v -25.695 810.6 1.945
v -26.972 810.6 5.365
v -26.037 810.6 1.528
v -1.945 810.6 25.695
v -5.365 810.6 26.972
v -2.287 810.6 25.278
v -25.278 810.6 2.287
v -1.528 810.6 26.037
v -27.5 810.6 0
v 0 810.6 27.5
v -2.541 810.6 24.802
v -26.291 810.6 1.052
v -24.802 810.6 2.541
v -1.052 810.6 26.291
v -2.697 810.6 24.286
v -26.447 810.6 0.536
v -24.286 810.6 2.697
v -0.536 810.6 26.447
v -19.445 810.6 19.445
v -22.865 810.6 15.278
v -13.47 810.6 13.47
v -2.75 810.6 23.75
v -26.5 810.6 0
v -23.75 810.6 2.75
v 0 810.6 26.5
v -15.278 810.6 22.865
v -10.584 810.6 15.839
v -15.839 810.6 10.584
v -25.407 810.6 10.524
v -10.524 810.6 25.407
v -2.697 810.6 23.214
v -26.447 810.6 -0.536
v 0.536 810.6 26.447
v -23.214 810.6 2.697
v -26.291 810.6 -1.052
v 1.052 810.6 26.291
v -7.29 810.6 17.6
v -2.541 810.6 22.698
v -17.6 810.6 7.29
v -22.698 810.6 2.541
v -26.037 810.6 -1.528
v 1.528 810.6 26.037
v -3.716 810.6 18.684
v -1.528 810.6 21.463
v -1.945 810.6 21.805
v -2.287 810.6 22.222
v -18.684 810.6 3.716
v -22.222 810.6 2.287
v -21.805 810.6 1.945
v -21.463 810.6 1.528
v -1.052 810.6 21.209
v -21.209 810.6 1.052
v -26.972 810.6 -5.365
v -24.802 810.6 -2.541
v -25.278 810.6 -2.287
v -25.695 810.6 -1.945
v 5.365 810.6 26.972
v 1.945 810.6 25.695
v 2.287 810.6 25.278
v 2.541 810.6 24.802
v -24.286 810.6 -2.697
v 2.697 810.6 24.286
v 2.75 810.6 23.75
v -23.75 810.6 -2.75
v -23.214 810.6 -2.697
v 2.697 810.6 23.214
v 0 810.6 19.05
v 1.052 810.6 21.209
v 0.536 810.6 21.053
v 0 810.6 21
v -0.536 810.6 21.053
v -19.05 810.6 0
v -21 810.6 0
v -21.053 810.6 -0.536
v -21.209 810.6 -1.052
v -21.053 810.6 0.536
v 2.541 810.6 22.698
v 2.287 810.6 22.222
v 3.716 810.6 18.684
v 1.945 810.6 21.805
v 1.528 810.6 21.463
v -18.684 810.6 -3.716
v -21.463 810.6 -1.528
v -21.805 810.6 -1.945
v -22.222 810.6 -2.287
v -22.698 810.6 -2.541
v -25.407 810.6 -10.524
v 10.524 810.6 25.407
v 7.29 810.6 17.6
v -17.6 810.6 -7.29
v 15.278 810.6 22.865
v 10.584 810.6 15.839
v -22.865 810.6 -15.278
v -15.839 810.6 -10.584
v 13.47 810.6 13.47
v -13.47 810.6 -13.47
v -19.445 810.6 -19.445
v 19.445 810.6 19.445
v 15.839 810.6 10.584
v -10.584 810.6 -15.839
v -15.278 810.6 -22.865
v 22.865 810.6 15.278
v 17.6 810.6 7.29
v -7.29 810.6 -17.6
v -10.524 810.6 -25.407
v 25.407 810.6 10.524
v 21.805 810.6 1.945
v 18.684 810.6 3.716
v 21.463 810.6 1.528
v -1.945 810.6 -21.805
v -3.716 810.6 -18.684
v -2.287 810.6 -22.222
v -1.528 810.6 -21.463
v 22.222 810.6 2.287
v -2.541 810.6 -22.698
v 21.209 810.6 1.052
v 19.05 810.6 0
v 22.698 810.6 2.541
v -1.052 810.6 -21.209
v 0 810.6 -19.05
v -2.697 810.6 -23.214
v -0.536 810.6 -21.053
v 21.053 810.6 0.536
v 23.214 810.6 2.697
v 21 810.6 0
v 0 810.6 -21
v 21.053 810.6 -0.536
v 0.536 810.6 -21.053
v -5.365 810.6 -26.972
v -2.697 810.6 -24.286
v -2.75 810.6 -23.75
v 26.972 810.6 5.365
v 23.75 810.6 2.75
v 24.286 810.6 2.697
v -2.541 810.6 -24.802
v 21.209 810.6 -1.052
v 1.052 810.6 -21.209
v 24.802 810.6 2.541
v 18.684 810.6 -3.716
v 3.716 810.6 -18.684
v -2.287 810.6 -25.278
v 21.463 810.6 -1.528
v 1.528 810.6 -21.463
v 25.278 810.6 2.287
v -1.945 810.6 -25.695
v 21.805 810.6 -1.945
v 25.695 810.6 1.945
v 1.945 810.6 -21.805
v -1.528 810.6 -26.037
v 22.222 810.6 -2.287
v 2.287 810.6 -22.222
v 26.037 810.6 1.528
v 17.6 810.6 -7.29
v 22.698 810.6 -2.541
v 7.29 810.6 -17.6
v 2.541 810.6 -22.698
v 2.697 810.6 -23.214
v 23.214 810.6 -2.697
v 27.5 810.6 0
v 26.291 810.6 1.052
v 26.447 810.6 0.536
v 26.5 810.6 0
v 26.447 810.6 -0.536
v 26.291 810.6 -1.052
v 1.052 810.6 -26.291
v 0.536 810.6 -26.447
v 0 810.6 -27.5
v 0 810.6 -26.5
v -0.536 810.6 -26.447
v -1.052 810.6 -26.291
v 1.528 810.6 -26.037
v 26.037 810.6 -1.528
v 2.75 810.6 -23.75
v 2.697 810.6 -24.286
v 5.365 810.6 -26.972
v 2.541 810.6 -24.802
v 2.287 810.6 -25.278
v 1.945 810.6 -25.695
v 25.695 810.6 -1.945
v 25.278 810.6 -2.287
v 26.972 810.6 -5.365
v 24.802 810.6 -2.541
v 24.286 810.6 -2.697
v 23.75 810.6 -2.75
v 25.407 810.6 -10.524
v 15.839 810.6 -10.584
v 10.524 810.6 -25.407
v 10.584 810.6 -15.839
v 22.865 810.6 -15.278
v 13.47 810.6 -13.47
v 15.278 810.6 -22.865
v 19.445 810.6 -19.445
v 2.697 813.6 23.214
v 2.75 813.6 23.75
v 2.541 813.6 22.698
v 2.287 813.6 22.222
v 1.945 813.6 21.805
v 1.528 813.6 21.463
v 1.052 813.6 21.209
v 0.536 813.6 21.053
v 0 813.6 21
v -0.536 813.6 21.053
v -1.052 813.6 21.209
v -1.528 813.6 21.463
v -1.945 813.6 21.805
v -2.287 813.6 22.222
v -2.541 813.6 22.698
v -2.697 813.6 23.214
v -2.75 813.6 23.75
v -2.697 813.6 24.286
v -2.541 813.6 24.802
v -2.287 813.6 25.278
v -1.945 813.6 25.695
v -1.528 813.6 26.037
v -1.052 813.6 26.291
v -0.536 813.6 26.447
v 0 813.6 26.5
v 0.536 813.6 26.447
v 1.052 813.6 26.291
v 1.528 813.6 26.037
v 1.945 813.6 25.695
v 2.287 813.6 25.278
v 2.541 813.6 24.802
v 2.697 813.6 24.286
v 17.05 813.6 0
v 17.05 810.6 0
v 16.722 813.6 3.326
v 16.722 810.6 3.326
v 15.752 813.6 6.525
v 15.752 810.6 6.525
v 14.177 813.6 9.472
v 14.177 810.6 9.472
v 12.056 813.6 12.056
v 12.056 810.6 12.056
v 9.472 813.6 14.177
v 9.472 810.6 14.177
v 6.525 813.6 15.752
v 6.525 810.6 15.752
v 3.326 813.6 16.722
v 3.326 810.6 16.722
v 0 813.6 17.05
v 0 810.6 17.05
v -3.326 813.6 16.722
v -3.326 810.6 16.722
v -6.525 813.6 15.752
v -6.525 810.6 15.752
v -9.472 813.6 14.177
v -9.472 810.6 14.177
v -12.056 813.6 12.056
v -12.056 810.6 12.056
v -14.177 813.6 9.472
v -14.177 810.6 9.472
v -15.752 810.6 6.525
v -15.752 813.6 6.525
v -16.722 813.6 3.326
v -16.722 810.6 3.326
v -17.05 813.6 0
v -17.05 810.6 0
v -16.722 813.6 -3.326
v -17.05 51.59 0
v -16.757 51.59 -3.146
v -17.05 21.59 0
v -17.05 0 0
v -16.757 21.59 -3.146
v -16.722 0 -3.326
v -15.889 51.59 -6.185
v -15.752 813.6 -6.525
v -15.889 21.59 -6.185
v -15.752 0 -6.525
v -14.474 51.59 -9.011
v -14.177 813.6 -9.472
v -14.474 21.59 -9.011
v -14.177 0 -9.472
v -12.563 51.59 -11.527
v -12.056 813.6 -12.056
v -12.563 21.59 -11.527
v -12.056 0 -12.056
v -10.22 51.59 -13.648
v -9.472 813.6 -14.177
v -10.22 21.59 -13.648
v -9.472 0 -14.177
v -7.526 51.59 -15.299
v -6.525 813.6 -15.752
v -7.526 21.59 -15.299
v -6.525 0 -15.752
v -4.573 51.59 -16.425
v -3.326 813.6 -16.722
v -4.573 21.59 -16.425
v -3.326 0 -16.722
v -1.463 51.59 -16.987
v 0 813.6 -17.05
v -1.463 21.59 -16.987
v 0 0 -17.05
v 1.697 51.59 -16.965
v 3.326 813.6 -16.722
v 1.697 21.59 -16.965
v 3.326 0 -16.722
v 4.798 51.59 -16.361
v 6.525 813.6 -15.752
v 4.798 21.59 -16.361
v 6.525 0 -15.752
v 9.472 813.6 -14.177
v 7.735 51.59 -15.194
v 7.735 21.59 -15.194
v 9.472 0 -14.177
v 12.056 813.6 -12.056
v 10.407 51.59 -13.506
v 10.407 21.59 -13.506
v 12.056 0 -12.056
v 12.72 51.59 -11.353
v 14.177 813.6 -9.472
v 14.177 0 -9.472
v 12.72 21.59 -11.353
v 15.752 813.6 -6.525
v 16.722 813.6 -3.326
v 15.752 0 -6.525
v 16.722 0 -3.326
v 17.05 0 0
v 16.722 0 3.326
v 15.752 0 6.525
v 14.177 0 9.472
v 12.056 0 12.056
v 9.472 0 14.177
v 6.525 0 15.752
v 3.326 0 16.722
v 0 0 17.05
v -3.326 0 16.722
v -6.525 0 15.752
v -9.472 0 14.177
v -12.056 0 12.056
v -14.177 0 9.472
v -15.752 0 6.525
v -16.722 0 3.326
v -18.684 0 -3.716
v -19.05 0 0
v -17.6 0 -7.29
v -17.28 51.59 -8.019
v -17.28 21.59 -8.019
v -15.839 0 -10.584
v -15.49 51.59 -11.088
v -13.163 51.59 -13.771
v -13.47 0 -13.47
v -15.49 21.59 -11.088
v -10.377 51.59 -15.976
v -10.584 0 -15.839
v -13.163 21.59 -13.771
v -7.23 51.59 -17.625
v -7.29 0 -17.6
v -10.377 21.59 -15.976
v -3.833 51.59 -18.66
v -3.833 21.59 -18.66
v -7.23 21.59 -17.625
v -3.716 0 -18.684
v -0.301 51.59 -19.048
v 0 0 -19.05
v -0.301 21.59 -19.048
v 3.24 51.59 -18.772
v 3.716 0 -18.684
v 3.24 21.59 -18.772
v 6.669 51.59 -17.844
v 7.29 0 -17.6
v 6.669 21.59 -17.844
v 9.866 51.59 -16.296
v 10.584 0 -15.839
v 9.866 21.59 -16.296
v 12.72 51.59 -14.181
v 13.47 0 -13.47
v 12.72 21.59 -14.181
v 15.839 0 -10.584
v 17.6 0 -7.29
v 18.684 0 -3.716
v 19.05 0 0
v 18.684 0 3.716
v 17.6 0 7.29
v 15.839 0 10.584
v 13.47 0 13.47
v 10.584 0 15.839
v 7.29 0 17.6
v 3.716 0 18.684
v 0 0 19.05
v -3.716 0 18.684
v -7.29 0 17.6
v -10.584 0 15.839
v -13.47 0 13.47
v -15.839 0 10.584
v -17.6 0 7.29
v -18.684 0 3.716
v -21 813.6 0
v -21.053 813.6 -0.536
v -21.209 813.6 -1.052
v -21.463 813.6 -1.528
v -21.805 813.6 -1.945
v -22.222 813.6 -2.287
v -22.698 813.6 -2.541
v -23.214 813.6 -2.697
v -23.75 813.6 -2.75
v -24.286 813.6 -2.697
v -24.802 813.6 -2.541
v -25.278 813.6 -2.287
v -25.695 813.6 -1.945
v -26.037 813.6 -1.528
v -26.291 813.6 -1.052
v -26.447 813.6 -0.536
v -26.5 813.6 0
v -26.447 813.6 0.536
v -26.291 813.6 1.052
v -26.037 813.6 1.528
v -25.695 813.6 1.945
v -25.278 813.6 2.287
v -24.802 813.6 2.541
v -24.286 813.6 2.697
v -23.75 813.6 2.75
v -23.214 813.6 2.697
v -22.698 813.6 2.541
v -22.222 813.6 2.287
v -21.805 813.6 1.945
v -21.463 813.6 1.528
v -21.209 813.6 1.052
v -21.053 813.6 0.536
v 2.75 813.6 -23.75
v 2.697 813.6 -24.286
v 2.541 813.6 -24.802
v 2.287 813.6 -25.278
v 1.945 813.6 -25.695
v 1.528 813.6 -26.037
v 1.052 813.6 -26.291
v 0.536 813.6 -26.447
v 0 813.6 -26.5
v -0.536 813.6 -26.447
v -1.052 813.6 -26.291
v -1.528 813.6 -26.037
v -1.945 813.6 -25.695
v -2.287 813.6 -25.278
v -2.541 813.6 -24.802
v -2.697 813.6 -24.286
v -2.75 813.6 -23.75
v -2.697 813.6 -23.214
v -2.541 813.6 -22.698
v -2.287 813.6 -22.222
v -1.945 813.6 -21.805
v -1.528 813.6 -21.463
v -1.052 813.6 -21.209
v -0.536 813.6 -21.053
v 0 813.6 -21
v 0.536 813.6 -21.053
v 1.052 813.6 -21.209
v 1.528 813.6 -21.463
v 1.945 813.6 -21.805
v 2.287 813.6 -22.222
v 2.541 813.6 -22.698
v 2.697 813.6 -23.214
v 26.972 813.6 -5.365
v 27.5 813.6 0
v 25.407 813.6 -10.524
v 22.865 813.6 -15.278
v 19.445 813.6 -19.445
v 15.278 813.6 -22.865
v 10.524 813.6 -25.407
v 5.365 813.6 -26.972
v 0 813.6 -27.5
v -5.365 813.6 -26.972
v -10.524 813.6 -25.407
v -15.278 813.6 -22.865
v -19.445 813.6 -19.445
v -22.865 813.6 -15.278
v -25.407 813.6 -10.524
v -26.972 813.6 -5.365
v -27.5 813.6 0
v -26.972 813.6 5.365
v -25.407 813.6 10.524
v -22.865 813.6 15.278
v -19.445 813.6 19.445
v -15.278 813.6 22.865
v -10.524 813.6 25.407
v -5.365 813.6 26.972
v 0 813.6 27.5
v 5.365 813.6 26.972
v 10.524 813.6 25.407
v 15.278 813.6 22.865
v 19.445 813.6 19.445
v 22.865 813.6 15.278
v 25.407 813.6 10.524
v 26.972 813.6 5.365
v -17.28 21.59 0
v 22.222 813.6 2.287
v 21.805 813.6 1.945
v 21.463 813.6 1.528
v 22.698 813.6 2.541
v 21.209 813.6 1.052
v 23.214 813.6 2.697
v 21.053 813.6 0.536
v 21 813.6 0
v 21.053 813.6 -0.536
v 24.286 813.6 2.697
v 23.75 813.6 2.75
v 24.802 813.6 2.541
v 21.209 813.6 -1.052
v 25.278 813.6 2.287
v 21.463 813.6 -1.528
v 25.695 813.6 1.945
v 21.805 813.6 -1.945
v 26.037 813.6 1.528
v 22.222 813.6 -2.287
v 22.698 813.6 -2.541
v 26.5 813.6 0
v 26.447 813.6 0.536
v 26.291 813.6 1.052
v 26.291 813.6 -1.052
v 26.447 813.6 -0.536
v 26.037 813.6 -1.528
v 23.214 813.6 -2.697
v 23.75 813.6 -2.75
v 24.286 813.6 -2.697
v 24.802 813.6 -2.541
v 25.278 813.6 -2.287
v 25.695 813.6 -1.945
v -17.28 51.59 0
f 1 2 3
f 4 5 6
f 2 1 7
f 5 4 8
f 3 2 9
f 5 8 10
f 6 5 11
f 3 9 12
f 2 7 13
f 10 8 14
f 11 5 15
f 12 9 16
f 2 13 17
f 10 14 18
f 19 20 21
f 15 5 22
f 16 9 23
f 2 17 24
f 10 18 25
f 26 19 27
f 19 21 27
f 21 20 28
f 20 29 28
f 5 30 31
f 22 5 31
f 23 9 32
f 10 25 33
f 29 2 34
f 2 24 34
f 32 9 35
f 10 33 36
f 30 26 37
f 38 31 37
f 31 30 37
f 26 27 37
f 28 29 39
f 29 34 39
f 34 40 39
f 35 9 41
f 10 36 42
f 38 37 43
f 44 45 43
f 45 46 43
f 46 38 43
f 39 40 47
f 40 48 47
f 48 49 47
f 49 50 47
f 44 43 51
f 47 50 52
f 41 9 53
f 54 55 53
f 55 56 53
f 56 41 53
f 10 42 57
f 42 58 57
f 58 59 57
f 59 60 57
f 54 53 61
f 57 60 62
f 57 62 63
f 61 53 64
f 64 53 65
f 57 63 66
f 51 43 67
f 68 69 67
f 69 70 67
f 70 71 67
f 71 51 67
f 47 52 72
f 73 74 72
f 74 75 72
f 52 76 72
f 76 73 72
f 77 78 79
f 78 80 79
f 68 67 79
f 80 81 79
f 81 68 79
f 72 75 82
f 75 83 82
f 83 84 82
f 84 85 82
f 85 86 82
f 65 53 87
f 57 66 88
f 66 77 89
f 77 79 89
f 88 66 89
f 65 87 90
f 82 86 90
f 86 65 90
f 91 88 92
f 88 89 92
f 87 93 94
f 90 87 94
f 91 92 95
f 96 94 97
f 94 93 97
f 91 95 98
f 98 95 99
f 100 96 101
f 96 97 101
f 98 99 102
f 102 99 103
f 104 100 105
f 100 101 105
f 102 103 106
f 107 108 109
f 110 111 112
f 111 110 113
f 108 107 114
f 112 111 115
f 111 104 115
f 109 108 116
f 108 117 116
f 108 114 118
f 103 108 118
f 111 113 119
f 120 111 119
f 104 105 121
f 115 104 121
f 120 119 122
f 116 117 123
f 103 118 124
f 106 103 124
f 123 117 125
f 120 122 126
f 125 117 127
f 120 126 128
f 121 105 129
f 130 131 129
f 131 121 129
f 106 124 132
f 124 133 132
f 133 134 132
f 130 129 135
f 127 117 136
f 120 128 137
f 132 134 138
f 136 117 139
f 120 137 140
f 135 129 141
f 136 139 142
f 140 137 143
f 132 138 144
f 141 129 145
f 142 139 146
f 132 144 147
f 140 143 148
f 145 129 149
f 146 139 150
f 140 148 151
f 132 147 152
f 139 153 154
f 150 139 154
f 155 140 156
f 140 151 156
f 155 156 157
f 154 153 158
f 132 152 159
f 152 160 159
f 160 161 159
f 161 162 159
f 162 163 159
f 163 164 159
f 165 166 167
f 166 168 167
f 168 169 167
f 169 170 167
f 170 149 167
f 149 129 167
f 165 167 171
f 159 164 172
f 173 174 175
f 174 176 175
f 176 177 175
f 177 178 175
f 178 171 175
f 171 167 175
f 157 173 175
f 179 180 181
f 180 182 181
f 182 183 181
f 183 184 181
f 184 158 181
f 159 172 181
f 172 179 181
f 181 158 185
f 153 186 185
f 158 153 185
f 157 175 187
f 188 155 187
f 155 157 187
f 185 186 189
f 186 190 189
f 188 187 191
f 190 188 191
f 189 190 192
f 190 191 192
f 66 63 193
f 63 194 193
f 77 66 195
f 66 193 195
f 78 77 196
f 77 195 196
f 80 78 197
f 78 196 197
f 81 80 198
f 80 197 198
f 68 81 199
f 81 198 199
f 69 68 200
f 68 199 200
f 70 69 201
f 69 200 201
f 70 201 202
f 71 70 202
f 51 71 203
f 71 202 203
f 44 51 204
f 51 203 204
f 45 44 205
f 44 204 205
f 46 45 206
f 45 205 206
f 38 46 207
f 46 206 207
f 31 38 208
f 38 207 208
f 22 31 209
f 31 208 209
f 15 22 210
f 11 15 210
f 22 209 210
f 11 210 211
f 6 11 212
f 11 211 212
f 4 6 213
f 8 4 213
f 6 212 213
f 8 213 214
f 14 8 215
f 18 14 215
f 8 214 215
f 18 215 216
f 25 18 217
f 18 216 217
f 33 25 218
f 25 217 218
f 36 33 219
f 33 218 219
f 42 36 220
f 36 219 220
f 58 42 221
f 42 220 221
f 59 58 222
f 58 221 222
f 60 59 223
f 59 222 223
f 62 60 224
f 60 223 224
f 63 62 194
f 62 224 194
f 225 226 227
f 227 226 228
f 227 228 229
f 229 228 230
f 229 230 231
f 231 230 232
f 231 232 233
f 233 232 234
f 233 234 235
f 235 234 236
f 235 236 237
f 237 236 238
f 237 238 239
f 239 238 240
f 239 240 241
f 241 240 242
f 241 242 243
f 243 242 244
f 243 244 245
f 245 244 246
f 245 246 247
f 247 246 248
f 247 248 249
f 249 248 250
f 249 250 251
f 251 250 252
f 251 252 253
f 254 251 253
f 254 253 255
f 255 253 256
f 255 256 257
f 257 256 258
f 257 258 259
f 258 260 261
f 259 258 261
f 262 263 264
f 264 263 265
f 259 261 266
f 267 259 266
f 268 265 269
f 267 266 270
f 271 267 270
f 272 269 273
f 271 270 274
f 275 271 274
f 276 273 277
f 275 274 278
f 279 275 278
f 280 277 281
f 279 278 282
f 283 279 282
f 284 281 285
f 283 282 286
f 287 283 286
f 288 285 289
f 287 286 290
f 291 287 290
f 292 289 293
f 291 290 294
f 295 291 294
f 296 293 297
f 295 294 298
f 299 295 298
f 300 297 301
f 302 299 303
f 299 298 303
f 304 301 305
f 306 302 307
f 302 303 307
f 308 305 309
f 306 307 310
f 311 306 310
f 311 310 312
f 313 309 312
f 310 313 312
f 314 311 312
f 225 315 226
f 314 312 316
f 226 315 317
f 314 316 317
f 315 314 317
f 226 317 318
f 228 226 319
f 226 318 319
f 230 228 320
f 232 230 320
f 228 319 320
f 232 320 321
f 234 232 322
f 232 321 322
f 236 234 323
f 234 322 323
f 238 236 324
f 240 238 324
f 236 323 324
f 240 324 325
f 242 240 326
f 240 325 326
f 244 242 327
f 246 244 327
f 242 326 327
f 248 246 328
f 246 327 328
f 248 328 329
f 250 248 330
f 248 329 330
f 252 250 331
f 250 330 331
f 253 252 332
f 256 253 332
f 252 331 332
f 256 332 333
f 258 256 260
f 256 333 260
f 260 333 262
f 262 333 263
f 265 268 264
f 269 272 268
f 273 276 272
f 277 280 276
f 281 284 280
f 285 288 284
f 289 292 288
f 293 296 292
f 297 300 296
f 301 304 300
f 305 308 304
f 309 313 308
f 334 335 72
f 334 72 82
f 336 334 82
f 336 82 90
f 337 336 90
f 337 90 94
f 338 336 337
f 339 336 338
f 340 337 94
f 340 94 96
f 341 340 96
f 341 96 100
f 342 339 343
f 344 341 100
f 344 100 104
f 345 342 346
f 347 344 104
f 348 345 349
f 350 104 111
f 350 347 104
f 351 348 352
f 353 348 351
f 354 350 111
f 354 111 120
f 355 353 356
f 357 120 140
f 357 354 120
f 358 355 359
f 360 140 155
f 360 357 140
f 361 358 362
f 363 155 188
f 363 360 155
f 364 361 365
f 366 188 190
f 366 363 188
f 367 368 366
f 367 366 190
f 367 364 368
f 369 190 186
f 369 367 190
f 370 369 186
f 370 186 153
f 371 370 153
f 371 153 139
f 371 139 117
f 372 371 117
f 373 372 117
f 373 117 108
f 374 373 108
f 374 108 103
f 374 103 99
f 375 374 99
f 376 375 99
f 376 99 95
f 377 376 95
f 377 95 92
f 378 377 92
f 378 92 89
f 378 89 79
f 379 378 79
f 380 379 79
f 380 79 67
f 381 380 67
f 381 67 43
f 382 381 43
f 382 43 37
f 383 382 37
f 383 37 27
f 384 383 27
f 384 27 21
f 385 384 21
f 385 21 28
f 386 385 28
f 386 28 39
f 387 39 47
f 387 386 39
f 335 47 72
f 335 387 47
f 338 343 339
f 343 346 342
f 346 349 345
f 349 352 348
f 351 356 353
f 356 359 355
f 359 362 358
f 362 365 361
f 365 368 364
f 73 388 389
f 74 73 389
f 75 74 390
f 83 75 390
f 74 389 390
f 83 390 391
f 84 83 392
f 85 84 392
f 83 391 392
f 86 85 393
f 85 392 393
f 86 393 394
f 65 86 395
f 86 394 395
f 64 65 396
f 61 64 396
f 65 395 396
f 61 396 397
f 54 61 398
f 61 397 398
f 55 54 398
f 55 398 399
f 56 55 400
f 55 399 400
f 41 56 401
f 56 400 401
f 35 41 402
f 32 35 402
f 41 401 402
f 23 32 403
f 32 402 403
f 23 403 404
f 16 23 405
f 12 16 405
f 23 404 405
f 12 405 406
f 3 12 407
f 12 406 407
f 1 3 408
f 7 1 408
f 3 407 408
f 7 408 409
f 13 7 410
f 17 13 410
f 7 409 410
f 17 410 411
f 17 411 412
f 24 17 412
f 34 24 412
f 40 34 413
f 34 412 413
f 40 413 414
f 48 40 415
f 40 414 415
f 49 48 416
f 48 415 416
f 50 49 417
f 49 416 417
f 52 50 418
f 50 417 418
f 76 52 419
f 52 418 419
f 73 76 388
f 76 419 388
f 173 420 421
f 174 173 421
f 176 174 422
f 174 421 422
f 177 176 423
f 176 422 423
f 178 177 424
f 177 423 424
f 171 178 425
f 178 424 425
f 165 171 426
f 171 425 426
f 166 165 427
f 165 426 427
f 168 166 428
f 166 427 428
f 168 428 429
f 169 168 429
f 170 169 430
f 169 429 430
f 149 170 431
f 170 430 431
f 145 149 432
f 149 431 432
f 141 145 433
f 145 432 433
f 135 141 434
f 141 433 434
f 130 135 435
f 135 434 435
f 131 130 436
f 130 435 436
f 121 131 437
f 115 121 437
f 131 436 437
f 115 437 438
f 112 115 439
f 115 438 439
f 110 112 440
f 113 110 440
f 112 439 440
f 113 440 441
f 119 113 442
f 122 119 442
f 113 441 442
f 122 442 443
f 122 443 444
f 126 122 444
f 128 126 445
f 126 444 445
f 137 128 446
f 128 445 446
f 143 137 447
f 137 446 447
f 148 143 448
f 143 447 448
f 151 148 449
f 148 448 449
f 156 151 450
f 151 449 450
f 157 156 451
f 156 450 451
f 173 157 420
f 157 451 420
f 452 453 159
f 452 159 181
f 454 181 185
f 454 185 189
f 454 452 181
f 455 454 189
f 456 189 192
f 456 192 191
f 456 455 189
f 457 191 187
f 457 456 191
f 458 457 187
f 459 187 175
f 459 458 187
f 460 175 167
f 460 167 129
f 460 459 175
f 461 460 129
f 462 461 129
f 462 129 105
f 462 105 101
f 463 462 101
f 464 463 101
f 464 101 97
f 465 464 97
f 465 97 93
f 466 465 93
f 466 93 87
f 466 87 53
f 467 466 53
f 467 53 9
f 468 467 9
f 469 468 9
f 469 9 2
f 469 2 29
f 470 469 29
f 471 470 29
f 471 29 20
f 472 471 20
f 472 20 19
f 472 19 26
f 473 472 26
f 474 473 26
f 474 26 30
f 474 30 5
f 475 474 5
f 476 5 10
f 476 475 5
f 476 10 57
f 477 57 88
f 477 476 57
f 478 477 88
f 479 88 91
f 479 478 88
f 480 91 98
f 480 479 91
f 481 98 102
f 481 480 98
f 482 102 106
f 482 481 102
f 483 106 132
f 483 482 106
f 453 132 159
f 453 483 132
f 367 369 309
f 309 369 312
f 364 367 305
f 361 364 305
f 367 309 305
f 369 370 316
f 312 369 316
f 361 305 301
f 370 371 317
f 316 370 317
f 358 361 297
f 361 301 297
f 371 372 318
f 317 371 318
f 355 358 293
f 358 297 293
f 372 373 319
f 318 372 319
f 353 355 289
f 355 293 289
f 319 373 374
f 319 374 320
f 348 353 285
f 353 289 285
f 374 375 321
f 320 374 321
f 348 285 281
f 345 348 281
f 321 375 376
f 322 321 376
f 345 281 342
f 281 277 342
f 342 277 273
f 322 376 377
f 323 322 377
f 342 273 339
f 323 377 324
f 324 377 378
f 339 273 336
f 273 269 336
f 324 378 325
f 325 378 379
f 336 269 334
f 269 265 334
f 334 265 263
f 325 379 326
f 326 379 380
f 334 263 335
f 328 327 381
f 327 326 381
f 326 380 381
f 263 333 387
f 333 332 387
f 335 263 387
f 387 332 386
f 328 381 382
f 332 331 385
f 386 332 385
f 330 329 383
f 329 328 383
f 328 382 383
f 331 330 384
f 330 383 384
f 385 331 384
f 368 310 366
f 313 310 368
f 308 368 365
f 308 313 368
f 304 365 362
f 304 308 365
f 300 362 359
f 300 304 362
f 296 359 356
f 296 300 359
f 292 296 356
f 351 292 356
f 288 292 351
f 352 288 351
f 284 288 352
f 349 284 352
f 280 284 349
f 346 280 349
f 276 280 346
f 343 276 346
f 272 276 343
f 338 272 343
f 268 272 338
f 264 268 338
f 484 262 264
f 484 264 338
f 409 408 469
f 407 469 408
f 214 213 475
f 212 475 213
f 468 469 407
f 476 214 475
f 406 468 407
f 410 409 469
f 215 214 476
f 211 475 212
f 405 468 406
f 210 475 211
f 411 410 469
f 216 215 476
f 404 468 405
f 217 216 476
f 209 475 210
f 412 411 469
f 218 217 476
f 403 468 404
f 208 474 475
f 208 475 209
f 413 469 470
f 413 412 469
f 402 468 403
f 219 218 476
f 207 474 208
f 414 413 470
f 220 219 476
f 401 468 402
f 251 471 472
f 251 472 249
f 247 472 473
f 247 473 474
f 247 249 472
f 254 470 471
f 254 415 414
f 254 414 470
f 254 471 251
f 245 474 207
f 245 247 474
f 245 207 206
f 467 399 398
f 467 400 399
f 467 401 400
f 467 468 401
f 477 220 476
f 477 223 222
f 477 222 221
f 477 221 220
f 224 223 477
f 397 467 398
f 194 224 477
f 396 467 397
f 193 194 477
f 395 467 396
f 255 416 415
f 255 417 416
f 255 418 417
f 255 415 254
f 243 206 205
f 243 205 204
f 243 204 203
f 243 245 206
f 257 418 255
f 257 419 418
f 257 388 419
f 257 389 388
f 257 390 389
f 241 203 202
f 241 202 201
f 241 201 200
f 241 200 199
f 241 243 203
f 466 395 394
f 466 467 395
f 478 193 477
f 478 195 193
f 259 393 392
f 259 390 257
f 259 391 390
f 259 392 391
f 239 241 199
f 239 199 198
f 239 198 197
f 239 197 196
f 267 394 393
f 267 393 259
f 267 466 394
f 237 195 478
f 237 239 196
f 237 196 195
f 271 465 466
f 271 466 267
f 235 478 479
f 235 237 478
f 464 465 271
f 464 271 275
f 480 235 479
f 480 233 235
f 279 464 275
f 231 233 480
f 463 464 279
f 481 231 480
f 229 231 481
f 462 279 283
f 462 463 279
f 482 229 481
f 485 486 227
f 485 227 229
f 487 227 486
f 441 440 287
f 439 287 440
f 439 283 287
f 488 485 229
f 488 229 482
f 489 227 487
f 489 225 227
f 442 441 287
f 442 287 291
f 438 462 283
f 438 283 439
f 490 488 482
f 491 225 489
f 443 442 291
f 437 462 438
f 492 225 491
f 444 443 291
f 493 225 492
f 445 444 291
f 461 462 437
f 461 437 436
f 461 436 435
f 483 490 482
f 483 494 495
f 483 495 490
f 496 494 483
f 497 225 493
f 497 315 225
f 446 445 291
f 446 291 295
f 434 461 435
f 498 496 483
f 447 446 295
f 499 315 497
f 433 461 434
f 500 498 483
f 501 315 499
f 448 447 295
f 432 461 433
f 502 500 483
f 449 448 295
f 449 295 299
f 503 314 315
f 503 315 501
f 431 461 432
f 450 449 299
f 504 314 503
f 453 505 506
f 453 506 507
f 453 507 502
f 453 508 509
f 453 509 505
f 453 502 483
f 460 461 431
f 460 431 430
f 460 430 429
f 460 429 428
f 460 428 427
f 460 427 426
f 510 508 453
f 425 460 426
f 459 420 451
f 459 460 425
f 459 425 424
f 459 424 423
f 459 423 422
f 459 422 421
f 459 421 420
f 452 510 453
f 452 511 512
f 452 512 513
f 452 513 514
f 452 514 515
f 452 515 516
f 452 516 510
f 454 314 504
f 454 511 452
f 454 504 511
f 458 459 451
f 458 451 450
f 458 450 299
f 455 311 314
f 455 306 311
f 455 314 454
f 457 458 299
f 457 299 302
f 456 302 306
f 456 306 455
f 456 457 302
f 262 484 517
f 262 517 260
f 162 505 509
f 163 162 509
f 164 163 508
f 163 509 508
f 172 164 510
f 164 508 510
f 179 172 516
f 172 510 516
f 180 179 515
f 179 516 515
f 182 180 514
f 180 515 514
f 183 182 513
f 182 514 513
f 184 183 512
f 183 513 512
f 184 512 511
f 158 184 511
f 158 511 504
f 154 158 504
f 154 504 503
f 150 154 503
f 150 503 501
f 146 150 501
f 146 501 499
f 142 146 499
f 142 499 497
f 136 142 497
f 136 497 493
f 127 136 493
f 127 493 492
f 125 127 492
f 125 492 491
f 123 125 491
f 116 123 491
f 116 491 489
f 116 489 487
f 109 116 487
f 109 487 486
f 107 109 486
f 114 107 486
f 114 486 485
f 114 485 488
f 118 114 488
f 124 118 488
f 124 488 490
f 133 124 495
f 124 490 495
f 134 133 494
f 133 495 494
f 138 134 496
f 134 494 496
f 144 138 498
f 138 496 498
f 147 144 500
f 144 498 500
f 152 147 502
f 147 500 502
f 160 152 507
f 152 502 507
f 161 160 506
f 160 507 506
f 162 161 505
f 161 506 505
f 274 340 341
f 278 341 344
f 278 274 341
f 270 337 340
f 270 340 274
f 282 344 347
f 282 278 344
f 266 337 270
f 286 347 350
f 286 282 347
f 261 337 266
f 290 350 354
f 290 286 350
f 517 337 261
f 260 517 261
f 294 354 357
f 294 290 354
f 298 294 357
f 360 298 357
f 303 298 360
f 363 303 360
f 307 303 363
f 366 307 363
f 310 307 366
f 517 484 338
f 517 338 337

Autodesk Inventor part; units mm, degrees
ref_plane "YZ Plane" through (0, 0, 0) normal (1, 0, 0) x (0, 1, 0)
ref_plane "XZ Plane" through (0, 0, 0) normal (0, 1, 0) x (-1, 0, 0)
ref_plane "XY Plane" through (0, 0, 0) normal (0, 0, 1) x (1, 0, 0)
sketch "Boceto1" plane through (0, 0, 0) normal (0, 1, 0) x (-1, 0, 0)
  circle A0 centre (0, 0) radius 17.05
  circle A1 centre (0, 0) radius 19.05
  dimension "d0" = 34.1
  dimension "d1" = 38.1
extrude "Extrusión1" add sketch "Boceto1" along normal blind 813.6
sketch "Boceto2" plane through (0, 0, 0) normal (0, 0, 1) x (1, 0, 0)
  line L0 (0, 0) -> (-263.1264, 0)
  line L1 (-263.1264, 0) -> (-263.1264, 271)
  line L2 (-263.1264, 135.5) -> (-17.2798, 135.5)
  line L3 (-19.05, 0) -> (-19.05, 813.6) projected
  line L4 (-17.2798, 135.5) -> (-17.2798, 51.5895)
  line L5 (-17.2798, 51.5895) -> (12.7202, 51.5895)
  line L6 (12.7202, 51.5895) -> (12.7202, 21.5895)
  line L7 (12.7202, 21.5895) -> (-17.2798, 21.5895)
  line L8 (-17.2798, 21.5895) -> (-17.2798, 51.5895)
  dimension "d4" = 271
  dimension "d5" = 30
  dimension "d6" = 30
extrude "Extrusión2" cut sketch "Boceto2" against normal blind 813.6 contours L5 L6 L7 L8
sketch "Boceto3" plane through (0, 813.6, 0) normal (0, 1, 0) x (1, 0, 0)
  circle A0 centre (0, 0) radius 27.5
  circle A1 centre (0, 0) radius 19.05
  dimension "d9" = 55
extrude "Extrusión3" add sketch "Boceto3" against normal blind 3 contours A0 | A1
sketch "Boceto4" plane through (0, 813.6, 0) normal (0, 1, 0) x (1, 0, 0)
  circle A0 centre (0, 0) radius 17.05 projected
  circle A1 centre (0, 0) radius 27.5 projected
  line L0 (0, 0) -> (0, 23.75)
  line L1 (0, 0) -> (23.75, 0)
  line L2 (0, 0) -> (0, -23.75)
  line L3 (0, 0) -> (-23.75, 0)
  circle A2 centre (0, 23.75) radius 2.75
  circle A3 centre (23.75, 0) radius 2.75
  circle A4 centre (0, -23.75) radius 2.75
  circle A5 centre (-23.75, 0) radius 2.75
  dimension "d22" = 23.75
  dimension "d23" = 23.75
  dimension "d24" = 23.75
  dimension "d25" = 23.75
  dimension "d26" = 5.5
  dimension "d27" = 5.5
  dimension "d28" = 5.5
  dimension "d29" = 5.5
extrude "Extrusión4" cut sketch "Boceto4" against normal blind 5.5 contours A4 | A5 | A2 | A3
sketch "Boceto5" plane through (0, 813.6, 0) normal (0, 1, 0) x (1, 0, 0)
  circle A0 centre (0, 0) radius 17.05
  dimension "d19" = 34.1
extrude "Extrusión5" cut sketch "Boceto5" against normal blind 3
equation "\"d17\" = d27"
properties part number "tubo cubierta tornillo"
